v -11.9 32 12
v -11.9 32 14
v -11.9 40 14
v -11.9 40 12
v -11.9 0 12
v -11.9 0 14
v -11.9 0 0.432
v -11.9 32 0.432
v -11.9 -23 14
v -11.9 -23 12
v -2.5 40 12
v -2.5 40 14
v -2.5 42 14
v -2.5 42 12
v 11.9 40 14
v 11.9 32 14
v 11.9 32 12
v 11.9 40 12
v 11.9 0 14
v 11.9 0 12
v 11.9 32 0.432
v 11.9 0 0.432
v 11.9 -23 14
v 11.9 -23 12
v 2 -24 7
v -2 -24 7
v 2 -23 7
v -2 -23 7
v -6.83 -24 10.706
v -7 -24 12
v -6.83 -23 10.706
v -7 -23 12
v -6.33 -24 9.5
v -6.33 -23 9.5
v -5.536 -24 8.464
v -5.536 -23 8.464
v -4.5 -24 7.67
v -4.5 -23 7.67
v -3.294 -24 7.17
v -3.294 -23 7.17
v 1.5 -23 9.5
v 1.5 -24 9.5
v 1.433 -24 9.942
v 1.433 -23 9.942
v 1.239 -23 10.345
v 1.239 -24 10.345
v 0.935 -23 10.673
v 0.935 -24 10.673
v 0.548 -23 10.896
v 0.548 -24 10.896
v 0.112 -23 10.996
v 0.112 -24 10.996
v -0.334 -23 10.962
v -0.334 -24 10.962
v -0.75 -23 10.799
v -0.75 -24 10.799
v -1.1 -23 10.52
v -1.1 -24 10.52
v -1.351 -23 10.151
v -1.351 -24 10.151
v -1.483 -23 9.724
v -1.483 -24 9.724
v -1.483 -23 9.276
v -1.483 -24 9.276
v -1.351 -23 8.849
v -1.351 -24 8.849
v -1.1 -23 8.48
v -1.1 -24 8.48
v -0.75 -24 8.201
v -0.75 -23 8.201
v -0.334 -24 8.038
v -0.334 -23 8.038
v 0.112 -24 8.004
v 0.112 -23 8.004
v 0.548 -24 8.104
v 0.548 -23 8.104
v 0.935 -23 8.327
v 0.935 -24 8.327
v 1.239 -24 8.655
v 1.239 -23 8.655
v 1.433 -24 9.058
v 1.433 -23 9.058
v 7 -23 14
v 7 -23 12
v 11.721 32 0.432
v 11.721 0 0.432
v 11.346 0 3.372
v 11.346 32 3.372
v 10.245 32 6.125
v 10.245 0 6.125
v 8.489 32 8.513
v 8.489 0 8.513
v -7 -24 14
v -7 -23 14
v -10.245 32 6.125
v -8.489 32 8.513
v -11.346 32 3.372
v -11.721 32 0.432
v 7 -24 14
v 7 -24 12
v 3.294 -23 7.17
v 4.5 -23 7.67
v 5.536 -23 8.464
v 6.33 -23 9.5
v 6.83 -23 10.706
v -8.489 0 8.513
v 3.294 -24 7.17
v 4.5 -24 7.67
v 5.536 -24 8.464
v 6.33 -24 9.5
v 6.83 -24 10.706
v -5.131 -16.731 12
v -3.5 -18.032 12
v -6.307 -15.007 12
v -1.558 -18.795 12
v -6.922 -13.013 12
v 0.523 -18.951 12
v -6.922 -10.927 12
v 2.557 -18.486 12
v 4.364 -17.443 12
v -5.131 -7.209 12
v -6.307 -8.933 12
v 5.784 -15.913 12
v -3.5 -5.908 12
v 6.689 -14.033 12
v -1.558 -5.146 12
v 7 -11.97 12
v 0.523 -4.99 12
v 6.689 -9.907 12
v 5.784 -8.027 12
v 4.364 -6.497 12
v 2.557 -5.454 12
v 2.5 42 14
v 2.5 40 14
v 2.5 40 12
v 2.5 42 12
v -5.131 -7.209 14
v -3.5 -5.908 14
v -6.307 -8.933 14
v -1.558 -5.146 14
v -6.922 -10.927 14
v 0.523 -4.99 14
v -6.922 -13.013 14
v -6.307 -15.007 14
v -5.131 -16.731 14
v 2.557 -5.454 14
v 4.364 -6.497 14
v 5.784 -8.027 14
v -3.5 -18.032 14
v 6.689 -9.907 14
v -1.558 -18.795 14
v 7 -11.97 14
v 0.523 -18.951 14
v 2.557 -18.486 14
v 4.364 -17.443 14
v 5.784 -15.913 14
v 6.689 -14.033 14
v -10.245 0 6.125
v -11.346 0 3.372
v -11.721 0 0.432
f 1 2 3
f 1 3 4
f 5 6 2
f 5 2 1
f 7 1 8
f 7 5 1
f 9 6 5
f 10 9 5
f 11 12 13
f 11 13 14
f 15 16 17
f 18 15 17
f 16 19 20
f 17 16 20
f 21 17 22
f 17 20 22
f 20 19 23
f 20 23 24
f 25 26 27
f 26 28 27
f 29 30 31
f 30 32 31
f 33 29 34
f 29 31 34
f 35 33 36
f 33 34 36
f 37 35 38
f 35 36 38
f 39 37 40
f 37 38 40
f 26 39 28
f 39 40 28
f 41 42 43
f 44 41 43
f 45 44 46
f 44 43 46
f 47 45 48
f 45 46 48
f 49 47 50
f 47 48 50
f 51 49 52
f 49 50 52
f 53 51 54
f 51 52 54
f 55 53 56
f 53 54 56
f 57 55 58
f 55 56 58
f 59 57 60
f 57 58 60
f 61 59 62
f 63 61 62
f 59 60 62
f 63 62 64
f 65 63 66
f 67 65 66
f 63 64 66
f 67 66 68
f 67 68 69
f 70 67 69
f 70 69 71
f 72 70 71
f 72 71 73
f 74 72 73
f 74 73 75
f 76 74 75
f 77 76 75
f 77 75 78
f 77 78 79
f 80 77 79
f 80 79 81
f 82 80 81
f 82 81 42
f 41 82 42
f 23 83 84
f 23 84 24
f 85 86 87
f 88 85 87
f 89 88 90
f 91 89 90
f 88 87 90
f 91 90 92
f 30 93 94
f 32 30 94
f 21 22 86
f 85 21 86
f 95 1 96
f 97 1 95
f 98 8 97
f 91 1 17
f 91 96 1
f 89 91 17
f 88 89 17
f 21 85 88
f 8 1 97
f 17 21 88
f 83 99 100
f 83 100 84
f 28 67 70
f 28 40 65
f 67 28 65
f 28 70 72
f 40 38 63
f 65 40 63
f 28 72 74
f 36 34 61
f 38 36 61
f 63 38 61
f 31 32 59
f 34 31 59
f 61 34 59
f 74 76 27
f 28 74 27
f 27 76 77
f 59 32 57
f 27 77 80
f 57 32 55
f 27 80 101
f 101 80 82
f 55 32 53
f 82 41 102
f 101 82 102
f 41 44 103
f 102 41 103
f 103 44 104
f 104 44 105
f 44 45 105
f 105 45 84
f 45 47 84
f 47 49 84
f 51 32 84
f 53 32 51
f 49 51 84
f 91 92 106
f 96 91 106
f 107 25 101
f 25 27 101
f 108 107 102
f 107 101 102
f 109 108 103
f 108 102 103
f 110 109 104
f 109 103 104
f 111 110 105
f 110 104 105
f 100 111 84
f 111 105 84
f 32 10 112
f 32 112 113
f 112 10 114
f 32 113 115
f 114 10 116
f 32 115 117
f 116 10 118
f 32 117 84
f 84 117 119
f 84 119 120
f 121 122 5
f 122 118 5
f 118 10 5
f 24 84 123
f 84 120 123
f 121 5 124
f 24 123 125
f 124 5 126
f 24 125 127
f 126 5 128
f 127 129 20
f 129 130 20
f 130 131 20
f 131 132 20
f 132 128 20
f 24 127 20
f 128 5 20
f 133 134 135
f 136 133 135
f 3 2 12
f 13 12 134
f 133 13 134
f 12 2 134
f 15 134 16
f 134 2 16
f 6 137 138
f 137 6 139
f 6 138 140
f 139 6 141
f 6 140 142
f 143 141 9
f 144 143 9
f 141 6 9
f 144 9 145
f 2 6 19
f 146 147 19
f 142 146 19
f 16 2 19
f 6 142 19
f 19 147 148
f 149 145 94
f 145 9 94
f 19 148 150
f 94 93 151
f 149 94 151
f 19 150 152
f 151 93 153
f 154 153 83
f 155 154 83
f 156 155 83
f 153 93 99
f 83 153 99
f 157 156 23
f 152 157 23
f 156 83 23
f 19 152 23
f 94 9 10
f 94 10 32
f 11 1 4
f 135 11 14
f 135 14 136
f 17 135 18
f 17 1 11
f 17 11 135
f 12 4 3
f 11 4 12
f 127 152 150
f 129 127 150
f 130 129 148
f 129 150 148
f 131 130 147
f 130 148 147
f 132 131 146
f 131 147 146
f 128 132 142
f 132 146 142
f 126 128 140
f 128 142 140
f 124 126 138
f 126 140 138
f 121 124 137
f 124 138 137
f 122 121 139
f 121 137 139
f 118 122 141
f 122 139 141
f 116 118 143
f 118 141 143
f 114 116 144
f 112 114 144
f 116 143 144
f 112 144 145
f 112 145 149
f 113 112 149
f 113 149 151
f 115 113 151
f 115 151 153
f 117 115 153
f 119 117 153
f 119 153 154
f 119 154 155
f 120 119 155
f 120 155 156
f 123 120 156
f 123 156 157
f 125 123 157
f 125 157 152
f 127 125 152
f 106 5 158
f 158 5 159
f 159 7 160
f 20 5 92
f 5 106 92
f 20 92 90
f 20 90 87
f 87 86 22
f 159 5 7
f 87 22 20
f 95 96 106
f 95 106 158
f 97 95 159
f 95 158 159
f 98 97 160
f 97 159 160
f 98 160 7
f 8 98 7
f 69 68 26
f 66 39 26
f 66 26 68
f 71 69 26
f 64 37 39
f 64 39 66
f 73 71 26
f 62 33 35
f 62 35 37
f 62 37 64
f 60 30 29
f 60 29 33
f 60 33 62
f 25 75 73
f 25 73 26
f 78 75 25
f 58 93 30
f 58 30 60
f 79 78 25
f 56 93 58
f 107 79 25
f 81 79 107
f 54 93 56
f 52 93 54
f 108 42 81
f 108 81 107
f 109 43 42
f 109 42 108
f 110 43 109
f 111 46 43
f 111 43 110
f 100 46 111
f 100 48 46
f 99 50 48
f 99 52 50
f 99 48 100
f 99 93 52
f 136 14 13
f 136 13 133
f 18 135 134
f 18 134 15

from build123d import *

# Parameters (mm, degrees)
BOSS_EXTRUDE1_DEPTH = 32
SKETCH2_W           = 13.568258361
SKETCH2_H           = 32
CUT_EXTRUDE1_DEPTH  = 2.1
SKETCH3_W           = 23.8
SKETCH3_H           = 2
BOSS_EXTRUDE2_DEPTH = 23
SKETCH4_W           = 23.8
SKETCH4_H           = 2
BOSS_EXTRUDE3_DEPTH = 8
CUT_EXTRUDE2_REACH  = 15.568
SKETCH5_R           = 7
SKETCH6_W           = 2.5
SKETCH6_H           = 2
BOSS_EXTRUDE4_DEPTH = 2
SKETCH7_W           = 7
SKETCH7_H           = 2
BOSS_EXTRUDE5_DEPTH = 1
BOSS_EXTRUDE6_START = -2
SKETCH8_W           = 14
SKETCH8_H           = 1
BOSS_EXTRUDE6_DEPTH = 5
CUT_EXTRUDE3_REACH  = 68
SKETCH9_R           = 1.5
FILLET1_R           = 5


with BuildPart() as part:
    # Sketch1 → Boss-Extrude1 (new body)
    with BuildSketch(Plane(origin=(0, 0, 0), x_dir=(1, 0, 0), z_dir=(0, 1, 0))):
        with BuildLine():
            Line((14, -0.431741639), (11.721082209, -0.431741639))
            ThreePointArc((11.721082209, -0.431741639), (10.883203702, -4.783711919), (8.489359235, -8.513483277))
            Line((8.489359235, -8.513483277), (-8.489359235, -8.513483277))
            ThreePointArc((-8.489359235, -8.513483277), (-10.883203702, -4.783711919), (-11.721082209, -0.431741639))
            Line((-11.721082209, -0.431741639), (-14, -0.431741639))
            Line((-14, -0.431741639), (-14, -14))
            Line((-14, -14), (14, -14))
            Line((14, -14), (14, -0.431741639))
        make_face()
    extrude(amount=BOSS_EXTRUDE1_DEPTH)

    # Sketch2 → Cut-Extrude1 (cut)
    with BuildSketch(Plane.ZY.offset(14)):
        with Locations((7.21587082, 16)):
            Rectangle(SKETCH2_W, SKETCH2_H)
    cut_extrude1 = extrude(amount=-CUT_EXTRUDE1_DEPTH, mode=Mode.SUBTRACT)

    # Mirror1: Cut-Extrude1 across plane
    add(cut_extrude1.mirror(Plane(origin=(0, 0, 0), x_dir=(0, 0, 1), z_dir=(1, 0, 0))), mode=Mode.SUBTRACT)

    # Sketch3 → Boss-Extrude2 (add)
    with BuildSketch(Plane.XZ):
        with Locations((0, 13)):
            Rectangle(SKETCH3_W, SKETCH3_H)
    extrude(amount=BOSS_EXTRUDE2_DEPTH)

    # Sketch4 → Boss-Extrude3 (add)
    with BuildSketch(Plane(origin=(0, 32, 0), x_dir=(1, 0, 0), z_dir=(0, 1, 0))):
        with Locations((0, -13)):
            Rectangle(SKETCH4_W, SKETCH4_H)
    extrude(amount=BOSS_EXTRUDE3_DEPTH)

    # Sketch5 → Cut-Extrude2 (cut, up to next)
    with BuildSketch(Plane.XY.offset(14), mode=Mode.PRIVATE) as cut_extrude2_sk1:
        with Locations((0, -11.97008474)):
            Circle(SKETCH5_R)
    cut_extrude2_tool1 = extrude(cut_extrude2_sk1.sketch, amount=-CUT_EXTRUDE2_REACH, mode=Mode.PRIVATE) & part.part
    add(cut_extrude2_tool1.solids().sort_by_distance((0, -11.970085, 14))[0], mode=Mode.SUBTRACT)

    # Sketch6 → Boss-Extrude4 (add)
    with BuildSketch(Plane(origin=(0, 40, 0), x_dir=(1, 0, 0), z_dir=(0, 1, 0))):
        with Locations((-1.25, -13)):
            Rectangle(SKETCH6_W, SKETCH6_H)
        with Locations((1.25, -13)):
            Rectangle(SKETCH6_W, SKETCH6_H)
    extrude(amount=BOSS_EXTRUDE4_DEPTH)

    # Sketch7 → Boss-Extrude5 (add)
    with BuildSketch(Plane.XZ.offset(23)):
        with Locations((3.5, 13)):
            Rectangle(SKETCH7_W, SKETCH7_H)
        with Locations((-3.5, 13)):
            Rectangle(SKETCH7_W, SKETCH7_H)
    extrude(amount=BOSS_EXTRUDE5_DEPTH)

    # Sketch8 → Boss-Extrude6 (add)
    with BuildSketch(Plane.XY.offset(14).offset(BOSS_EXTRUDE6_START)):
        with Locations((0, -23.5)):
            Rectangle(SKETCH8_W, SKETCH8_H)
    extrude(amount=-BOSS_EXTRUDE6_DEPTH)

    # Sketch9 → Cut-Extrude3 (cut, up to next)
    with BuildSketch(Plane.XZ.offset(24), mode=Mode.PRIVATE) as cut_extrude3_sk1:
        with Locations((0, 9.5)):
            Circle(SKETCH9_R)
    cut_extrude3_tool1 = extrude(cut_extrude3_sk1.sketch, amount=-CUT_EXTRUDE3_REACH, mode=Mode.PRIVATE) & part.part
    add(cut_extrude3_tool1.solids().sort_by_distance((0, -24, 9.5))[0], mode=Mode.SUBTRACT)

    # Fillet1
    fillet1_edges = [part.edges().sort_by_distance(p)[0] for p in [
        (-7, -23.5, 7),
        (7, -23.5, 7),
    ]]
    fillet(fillet1_edges, radius=FILLET1_R)


solid = part.part
